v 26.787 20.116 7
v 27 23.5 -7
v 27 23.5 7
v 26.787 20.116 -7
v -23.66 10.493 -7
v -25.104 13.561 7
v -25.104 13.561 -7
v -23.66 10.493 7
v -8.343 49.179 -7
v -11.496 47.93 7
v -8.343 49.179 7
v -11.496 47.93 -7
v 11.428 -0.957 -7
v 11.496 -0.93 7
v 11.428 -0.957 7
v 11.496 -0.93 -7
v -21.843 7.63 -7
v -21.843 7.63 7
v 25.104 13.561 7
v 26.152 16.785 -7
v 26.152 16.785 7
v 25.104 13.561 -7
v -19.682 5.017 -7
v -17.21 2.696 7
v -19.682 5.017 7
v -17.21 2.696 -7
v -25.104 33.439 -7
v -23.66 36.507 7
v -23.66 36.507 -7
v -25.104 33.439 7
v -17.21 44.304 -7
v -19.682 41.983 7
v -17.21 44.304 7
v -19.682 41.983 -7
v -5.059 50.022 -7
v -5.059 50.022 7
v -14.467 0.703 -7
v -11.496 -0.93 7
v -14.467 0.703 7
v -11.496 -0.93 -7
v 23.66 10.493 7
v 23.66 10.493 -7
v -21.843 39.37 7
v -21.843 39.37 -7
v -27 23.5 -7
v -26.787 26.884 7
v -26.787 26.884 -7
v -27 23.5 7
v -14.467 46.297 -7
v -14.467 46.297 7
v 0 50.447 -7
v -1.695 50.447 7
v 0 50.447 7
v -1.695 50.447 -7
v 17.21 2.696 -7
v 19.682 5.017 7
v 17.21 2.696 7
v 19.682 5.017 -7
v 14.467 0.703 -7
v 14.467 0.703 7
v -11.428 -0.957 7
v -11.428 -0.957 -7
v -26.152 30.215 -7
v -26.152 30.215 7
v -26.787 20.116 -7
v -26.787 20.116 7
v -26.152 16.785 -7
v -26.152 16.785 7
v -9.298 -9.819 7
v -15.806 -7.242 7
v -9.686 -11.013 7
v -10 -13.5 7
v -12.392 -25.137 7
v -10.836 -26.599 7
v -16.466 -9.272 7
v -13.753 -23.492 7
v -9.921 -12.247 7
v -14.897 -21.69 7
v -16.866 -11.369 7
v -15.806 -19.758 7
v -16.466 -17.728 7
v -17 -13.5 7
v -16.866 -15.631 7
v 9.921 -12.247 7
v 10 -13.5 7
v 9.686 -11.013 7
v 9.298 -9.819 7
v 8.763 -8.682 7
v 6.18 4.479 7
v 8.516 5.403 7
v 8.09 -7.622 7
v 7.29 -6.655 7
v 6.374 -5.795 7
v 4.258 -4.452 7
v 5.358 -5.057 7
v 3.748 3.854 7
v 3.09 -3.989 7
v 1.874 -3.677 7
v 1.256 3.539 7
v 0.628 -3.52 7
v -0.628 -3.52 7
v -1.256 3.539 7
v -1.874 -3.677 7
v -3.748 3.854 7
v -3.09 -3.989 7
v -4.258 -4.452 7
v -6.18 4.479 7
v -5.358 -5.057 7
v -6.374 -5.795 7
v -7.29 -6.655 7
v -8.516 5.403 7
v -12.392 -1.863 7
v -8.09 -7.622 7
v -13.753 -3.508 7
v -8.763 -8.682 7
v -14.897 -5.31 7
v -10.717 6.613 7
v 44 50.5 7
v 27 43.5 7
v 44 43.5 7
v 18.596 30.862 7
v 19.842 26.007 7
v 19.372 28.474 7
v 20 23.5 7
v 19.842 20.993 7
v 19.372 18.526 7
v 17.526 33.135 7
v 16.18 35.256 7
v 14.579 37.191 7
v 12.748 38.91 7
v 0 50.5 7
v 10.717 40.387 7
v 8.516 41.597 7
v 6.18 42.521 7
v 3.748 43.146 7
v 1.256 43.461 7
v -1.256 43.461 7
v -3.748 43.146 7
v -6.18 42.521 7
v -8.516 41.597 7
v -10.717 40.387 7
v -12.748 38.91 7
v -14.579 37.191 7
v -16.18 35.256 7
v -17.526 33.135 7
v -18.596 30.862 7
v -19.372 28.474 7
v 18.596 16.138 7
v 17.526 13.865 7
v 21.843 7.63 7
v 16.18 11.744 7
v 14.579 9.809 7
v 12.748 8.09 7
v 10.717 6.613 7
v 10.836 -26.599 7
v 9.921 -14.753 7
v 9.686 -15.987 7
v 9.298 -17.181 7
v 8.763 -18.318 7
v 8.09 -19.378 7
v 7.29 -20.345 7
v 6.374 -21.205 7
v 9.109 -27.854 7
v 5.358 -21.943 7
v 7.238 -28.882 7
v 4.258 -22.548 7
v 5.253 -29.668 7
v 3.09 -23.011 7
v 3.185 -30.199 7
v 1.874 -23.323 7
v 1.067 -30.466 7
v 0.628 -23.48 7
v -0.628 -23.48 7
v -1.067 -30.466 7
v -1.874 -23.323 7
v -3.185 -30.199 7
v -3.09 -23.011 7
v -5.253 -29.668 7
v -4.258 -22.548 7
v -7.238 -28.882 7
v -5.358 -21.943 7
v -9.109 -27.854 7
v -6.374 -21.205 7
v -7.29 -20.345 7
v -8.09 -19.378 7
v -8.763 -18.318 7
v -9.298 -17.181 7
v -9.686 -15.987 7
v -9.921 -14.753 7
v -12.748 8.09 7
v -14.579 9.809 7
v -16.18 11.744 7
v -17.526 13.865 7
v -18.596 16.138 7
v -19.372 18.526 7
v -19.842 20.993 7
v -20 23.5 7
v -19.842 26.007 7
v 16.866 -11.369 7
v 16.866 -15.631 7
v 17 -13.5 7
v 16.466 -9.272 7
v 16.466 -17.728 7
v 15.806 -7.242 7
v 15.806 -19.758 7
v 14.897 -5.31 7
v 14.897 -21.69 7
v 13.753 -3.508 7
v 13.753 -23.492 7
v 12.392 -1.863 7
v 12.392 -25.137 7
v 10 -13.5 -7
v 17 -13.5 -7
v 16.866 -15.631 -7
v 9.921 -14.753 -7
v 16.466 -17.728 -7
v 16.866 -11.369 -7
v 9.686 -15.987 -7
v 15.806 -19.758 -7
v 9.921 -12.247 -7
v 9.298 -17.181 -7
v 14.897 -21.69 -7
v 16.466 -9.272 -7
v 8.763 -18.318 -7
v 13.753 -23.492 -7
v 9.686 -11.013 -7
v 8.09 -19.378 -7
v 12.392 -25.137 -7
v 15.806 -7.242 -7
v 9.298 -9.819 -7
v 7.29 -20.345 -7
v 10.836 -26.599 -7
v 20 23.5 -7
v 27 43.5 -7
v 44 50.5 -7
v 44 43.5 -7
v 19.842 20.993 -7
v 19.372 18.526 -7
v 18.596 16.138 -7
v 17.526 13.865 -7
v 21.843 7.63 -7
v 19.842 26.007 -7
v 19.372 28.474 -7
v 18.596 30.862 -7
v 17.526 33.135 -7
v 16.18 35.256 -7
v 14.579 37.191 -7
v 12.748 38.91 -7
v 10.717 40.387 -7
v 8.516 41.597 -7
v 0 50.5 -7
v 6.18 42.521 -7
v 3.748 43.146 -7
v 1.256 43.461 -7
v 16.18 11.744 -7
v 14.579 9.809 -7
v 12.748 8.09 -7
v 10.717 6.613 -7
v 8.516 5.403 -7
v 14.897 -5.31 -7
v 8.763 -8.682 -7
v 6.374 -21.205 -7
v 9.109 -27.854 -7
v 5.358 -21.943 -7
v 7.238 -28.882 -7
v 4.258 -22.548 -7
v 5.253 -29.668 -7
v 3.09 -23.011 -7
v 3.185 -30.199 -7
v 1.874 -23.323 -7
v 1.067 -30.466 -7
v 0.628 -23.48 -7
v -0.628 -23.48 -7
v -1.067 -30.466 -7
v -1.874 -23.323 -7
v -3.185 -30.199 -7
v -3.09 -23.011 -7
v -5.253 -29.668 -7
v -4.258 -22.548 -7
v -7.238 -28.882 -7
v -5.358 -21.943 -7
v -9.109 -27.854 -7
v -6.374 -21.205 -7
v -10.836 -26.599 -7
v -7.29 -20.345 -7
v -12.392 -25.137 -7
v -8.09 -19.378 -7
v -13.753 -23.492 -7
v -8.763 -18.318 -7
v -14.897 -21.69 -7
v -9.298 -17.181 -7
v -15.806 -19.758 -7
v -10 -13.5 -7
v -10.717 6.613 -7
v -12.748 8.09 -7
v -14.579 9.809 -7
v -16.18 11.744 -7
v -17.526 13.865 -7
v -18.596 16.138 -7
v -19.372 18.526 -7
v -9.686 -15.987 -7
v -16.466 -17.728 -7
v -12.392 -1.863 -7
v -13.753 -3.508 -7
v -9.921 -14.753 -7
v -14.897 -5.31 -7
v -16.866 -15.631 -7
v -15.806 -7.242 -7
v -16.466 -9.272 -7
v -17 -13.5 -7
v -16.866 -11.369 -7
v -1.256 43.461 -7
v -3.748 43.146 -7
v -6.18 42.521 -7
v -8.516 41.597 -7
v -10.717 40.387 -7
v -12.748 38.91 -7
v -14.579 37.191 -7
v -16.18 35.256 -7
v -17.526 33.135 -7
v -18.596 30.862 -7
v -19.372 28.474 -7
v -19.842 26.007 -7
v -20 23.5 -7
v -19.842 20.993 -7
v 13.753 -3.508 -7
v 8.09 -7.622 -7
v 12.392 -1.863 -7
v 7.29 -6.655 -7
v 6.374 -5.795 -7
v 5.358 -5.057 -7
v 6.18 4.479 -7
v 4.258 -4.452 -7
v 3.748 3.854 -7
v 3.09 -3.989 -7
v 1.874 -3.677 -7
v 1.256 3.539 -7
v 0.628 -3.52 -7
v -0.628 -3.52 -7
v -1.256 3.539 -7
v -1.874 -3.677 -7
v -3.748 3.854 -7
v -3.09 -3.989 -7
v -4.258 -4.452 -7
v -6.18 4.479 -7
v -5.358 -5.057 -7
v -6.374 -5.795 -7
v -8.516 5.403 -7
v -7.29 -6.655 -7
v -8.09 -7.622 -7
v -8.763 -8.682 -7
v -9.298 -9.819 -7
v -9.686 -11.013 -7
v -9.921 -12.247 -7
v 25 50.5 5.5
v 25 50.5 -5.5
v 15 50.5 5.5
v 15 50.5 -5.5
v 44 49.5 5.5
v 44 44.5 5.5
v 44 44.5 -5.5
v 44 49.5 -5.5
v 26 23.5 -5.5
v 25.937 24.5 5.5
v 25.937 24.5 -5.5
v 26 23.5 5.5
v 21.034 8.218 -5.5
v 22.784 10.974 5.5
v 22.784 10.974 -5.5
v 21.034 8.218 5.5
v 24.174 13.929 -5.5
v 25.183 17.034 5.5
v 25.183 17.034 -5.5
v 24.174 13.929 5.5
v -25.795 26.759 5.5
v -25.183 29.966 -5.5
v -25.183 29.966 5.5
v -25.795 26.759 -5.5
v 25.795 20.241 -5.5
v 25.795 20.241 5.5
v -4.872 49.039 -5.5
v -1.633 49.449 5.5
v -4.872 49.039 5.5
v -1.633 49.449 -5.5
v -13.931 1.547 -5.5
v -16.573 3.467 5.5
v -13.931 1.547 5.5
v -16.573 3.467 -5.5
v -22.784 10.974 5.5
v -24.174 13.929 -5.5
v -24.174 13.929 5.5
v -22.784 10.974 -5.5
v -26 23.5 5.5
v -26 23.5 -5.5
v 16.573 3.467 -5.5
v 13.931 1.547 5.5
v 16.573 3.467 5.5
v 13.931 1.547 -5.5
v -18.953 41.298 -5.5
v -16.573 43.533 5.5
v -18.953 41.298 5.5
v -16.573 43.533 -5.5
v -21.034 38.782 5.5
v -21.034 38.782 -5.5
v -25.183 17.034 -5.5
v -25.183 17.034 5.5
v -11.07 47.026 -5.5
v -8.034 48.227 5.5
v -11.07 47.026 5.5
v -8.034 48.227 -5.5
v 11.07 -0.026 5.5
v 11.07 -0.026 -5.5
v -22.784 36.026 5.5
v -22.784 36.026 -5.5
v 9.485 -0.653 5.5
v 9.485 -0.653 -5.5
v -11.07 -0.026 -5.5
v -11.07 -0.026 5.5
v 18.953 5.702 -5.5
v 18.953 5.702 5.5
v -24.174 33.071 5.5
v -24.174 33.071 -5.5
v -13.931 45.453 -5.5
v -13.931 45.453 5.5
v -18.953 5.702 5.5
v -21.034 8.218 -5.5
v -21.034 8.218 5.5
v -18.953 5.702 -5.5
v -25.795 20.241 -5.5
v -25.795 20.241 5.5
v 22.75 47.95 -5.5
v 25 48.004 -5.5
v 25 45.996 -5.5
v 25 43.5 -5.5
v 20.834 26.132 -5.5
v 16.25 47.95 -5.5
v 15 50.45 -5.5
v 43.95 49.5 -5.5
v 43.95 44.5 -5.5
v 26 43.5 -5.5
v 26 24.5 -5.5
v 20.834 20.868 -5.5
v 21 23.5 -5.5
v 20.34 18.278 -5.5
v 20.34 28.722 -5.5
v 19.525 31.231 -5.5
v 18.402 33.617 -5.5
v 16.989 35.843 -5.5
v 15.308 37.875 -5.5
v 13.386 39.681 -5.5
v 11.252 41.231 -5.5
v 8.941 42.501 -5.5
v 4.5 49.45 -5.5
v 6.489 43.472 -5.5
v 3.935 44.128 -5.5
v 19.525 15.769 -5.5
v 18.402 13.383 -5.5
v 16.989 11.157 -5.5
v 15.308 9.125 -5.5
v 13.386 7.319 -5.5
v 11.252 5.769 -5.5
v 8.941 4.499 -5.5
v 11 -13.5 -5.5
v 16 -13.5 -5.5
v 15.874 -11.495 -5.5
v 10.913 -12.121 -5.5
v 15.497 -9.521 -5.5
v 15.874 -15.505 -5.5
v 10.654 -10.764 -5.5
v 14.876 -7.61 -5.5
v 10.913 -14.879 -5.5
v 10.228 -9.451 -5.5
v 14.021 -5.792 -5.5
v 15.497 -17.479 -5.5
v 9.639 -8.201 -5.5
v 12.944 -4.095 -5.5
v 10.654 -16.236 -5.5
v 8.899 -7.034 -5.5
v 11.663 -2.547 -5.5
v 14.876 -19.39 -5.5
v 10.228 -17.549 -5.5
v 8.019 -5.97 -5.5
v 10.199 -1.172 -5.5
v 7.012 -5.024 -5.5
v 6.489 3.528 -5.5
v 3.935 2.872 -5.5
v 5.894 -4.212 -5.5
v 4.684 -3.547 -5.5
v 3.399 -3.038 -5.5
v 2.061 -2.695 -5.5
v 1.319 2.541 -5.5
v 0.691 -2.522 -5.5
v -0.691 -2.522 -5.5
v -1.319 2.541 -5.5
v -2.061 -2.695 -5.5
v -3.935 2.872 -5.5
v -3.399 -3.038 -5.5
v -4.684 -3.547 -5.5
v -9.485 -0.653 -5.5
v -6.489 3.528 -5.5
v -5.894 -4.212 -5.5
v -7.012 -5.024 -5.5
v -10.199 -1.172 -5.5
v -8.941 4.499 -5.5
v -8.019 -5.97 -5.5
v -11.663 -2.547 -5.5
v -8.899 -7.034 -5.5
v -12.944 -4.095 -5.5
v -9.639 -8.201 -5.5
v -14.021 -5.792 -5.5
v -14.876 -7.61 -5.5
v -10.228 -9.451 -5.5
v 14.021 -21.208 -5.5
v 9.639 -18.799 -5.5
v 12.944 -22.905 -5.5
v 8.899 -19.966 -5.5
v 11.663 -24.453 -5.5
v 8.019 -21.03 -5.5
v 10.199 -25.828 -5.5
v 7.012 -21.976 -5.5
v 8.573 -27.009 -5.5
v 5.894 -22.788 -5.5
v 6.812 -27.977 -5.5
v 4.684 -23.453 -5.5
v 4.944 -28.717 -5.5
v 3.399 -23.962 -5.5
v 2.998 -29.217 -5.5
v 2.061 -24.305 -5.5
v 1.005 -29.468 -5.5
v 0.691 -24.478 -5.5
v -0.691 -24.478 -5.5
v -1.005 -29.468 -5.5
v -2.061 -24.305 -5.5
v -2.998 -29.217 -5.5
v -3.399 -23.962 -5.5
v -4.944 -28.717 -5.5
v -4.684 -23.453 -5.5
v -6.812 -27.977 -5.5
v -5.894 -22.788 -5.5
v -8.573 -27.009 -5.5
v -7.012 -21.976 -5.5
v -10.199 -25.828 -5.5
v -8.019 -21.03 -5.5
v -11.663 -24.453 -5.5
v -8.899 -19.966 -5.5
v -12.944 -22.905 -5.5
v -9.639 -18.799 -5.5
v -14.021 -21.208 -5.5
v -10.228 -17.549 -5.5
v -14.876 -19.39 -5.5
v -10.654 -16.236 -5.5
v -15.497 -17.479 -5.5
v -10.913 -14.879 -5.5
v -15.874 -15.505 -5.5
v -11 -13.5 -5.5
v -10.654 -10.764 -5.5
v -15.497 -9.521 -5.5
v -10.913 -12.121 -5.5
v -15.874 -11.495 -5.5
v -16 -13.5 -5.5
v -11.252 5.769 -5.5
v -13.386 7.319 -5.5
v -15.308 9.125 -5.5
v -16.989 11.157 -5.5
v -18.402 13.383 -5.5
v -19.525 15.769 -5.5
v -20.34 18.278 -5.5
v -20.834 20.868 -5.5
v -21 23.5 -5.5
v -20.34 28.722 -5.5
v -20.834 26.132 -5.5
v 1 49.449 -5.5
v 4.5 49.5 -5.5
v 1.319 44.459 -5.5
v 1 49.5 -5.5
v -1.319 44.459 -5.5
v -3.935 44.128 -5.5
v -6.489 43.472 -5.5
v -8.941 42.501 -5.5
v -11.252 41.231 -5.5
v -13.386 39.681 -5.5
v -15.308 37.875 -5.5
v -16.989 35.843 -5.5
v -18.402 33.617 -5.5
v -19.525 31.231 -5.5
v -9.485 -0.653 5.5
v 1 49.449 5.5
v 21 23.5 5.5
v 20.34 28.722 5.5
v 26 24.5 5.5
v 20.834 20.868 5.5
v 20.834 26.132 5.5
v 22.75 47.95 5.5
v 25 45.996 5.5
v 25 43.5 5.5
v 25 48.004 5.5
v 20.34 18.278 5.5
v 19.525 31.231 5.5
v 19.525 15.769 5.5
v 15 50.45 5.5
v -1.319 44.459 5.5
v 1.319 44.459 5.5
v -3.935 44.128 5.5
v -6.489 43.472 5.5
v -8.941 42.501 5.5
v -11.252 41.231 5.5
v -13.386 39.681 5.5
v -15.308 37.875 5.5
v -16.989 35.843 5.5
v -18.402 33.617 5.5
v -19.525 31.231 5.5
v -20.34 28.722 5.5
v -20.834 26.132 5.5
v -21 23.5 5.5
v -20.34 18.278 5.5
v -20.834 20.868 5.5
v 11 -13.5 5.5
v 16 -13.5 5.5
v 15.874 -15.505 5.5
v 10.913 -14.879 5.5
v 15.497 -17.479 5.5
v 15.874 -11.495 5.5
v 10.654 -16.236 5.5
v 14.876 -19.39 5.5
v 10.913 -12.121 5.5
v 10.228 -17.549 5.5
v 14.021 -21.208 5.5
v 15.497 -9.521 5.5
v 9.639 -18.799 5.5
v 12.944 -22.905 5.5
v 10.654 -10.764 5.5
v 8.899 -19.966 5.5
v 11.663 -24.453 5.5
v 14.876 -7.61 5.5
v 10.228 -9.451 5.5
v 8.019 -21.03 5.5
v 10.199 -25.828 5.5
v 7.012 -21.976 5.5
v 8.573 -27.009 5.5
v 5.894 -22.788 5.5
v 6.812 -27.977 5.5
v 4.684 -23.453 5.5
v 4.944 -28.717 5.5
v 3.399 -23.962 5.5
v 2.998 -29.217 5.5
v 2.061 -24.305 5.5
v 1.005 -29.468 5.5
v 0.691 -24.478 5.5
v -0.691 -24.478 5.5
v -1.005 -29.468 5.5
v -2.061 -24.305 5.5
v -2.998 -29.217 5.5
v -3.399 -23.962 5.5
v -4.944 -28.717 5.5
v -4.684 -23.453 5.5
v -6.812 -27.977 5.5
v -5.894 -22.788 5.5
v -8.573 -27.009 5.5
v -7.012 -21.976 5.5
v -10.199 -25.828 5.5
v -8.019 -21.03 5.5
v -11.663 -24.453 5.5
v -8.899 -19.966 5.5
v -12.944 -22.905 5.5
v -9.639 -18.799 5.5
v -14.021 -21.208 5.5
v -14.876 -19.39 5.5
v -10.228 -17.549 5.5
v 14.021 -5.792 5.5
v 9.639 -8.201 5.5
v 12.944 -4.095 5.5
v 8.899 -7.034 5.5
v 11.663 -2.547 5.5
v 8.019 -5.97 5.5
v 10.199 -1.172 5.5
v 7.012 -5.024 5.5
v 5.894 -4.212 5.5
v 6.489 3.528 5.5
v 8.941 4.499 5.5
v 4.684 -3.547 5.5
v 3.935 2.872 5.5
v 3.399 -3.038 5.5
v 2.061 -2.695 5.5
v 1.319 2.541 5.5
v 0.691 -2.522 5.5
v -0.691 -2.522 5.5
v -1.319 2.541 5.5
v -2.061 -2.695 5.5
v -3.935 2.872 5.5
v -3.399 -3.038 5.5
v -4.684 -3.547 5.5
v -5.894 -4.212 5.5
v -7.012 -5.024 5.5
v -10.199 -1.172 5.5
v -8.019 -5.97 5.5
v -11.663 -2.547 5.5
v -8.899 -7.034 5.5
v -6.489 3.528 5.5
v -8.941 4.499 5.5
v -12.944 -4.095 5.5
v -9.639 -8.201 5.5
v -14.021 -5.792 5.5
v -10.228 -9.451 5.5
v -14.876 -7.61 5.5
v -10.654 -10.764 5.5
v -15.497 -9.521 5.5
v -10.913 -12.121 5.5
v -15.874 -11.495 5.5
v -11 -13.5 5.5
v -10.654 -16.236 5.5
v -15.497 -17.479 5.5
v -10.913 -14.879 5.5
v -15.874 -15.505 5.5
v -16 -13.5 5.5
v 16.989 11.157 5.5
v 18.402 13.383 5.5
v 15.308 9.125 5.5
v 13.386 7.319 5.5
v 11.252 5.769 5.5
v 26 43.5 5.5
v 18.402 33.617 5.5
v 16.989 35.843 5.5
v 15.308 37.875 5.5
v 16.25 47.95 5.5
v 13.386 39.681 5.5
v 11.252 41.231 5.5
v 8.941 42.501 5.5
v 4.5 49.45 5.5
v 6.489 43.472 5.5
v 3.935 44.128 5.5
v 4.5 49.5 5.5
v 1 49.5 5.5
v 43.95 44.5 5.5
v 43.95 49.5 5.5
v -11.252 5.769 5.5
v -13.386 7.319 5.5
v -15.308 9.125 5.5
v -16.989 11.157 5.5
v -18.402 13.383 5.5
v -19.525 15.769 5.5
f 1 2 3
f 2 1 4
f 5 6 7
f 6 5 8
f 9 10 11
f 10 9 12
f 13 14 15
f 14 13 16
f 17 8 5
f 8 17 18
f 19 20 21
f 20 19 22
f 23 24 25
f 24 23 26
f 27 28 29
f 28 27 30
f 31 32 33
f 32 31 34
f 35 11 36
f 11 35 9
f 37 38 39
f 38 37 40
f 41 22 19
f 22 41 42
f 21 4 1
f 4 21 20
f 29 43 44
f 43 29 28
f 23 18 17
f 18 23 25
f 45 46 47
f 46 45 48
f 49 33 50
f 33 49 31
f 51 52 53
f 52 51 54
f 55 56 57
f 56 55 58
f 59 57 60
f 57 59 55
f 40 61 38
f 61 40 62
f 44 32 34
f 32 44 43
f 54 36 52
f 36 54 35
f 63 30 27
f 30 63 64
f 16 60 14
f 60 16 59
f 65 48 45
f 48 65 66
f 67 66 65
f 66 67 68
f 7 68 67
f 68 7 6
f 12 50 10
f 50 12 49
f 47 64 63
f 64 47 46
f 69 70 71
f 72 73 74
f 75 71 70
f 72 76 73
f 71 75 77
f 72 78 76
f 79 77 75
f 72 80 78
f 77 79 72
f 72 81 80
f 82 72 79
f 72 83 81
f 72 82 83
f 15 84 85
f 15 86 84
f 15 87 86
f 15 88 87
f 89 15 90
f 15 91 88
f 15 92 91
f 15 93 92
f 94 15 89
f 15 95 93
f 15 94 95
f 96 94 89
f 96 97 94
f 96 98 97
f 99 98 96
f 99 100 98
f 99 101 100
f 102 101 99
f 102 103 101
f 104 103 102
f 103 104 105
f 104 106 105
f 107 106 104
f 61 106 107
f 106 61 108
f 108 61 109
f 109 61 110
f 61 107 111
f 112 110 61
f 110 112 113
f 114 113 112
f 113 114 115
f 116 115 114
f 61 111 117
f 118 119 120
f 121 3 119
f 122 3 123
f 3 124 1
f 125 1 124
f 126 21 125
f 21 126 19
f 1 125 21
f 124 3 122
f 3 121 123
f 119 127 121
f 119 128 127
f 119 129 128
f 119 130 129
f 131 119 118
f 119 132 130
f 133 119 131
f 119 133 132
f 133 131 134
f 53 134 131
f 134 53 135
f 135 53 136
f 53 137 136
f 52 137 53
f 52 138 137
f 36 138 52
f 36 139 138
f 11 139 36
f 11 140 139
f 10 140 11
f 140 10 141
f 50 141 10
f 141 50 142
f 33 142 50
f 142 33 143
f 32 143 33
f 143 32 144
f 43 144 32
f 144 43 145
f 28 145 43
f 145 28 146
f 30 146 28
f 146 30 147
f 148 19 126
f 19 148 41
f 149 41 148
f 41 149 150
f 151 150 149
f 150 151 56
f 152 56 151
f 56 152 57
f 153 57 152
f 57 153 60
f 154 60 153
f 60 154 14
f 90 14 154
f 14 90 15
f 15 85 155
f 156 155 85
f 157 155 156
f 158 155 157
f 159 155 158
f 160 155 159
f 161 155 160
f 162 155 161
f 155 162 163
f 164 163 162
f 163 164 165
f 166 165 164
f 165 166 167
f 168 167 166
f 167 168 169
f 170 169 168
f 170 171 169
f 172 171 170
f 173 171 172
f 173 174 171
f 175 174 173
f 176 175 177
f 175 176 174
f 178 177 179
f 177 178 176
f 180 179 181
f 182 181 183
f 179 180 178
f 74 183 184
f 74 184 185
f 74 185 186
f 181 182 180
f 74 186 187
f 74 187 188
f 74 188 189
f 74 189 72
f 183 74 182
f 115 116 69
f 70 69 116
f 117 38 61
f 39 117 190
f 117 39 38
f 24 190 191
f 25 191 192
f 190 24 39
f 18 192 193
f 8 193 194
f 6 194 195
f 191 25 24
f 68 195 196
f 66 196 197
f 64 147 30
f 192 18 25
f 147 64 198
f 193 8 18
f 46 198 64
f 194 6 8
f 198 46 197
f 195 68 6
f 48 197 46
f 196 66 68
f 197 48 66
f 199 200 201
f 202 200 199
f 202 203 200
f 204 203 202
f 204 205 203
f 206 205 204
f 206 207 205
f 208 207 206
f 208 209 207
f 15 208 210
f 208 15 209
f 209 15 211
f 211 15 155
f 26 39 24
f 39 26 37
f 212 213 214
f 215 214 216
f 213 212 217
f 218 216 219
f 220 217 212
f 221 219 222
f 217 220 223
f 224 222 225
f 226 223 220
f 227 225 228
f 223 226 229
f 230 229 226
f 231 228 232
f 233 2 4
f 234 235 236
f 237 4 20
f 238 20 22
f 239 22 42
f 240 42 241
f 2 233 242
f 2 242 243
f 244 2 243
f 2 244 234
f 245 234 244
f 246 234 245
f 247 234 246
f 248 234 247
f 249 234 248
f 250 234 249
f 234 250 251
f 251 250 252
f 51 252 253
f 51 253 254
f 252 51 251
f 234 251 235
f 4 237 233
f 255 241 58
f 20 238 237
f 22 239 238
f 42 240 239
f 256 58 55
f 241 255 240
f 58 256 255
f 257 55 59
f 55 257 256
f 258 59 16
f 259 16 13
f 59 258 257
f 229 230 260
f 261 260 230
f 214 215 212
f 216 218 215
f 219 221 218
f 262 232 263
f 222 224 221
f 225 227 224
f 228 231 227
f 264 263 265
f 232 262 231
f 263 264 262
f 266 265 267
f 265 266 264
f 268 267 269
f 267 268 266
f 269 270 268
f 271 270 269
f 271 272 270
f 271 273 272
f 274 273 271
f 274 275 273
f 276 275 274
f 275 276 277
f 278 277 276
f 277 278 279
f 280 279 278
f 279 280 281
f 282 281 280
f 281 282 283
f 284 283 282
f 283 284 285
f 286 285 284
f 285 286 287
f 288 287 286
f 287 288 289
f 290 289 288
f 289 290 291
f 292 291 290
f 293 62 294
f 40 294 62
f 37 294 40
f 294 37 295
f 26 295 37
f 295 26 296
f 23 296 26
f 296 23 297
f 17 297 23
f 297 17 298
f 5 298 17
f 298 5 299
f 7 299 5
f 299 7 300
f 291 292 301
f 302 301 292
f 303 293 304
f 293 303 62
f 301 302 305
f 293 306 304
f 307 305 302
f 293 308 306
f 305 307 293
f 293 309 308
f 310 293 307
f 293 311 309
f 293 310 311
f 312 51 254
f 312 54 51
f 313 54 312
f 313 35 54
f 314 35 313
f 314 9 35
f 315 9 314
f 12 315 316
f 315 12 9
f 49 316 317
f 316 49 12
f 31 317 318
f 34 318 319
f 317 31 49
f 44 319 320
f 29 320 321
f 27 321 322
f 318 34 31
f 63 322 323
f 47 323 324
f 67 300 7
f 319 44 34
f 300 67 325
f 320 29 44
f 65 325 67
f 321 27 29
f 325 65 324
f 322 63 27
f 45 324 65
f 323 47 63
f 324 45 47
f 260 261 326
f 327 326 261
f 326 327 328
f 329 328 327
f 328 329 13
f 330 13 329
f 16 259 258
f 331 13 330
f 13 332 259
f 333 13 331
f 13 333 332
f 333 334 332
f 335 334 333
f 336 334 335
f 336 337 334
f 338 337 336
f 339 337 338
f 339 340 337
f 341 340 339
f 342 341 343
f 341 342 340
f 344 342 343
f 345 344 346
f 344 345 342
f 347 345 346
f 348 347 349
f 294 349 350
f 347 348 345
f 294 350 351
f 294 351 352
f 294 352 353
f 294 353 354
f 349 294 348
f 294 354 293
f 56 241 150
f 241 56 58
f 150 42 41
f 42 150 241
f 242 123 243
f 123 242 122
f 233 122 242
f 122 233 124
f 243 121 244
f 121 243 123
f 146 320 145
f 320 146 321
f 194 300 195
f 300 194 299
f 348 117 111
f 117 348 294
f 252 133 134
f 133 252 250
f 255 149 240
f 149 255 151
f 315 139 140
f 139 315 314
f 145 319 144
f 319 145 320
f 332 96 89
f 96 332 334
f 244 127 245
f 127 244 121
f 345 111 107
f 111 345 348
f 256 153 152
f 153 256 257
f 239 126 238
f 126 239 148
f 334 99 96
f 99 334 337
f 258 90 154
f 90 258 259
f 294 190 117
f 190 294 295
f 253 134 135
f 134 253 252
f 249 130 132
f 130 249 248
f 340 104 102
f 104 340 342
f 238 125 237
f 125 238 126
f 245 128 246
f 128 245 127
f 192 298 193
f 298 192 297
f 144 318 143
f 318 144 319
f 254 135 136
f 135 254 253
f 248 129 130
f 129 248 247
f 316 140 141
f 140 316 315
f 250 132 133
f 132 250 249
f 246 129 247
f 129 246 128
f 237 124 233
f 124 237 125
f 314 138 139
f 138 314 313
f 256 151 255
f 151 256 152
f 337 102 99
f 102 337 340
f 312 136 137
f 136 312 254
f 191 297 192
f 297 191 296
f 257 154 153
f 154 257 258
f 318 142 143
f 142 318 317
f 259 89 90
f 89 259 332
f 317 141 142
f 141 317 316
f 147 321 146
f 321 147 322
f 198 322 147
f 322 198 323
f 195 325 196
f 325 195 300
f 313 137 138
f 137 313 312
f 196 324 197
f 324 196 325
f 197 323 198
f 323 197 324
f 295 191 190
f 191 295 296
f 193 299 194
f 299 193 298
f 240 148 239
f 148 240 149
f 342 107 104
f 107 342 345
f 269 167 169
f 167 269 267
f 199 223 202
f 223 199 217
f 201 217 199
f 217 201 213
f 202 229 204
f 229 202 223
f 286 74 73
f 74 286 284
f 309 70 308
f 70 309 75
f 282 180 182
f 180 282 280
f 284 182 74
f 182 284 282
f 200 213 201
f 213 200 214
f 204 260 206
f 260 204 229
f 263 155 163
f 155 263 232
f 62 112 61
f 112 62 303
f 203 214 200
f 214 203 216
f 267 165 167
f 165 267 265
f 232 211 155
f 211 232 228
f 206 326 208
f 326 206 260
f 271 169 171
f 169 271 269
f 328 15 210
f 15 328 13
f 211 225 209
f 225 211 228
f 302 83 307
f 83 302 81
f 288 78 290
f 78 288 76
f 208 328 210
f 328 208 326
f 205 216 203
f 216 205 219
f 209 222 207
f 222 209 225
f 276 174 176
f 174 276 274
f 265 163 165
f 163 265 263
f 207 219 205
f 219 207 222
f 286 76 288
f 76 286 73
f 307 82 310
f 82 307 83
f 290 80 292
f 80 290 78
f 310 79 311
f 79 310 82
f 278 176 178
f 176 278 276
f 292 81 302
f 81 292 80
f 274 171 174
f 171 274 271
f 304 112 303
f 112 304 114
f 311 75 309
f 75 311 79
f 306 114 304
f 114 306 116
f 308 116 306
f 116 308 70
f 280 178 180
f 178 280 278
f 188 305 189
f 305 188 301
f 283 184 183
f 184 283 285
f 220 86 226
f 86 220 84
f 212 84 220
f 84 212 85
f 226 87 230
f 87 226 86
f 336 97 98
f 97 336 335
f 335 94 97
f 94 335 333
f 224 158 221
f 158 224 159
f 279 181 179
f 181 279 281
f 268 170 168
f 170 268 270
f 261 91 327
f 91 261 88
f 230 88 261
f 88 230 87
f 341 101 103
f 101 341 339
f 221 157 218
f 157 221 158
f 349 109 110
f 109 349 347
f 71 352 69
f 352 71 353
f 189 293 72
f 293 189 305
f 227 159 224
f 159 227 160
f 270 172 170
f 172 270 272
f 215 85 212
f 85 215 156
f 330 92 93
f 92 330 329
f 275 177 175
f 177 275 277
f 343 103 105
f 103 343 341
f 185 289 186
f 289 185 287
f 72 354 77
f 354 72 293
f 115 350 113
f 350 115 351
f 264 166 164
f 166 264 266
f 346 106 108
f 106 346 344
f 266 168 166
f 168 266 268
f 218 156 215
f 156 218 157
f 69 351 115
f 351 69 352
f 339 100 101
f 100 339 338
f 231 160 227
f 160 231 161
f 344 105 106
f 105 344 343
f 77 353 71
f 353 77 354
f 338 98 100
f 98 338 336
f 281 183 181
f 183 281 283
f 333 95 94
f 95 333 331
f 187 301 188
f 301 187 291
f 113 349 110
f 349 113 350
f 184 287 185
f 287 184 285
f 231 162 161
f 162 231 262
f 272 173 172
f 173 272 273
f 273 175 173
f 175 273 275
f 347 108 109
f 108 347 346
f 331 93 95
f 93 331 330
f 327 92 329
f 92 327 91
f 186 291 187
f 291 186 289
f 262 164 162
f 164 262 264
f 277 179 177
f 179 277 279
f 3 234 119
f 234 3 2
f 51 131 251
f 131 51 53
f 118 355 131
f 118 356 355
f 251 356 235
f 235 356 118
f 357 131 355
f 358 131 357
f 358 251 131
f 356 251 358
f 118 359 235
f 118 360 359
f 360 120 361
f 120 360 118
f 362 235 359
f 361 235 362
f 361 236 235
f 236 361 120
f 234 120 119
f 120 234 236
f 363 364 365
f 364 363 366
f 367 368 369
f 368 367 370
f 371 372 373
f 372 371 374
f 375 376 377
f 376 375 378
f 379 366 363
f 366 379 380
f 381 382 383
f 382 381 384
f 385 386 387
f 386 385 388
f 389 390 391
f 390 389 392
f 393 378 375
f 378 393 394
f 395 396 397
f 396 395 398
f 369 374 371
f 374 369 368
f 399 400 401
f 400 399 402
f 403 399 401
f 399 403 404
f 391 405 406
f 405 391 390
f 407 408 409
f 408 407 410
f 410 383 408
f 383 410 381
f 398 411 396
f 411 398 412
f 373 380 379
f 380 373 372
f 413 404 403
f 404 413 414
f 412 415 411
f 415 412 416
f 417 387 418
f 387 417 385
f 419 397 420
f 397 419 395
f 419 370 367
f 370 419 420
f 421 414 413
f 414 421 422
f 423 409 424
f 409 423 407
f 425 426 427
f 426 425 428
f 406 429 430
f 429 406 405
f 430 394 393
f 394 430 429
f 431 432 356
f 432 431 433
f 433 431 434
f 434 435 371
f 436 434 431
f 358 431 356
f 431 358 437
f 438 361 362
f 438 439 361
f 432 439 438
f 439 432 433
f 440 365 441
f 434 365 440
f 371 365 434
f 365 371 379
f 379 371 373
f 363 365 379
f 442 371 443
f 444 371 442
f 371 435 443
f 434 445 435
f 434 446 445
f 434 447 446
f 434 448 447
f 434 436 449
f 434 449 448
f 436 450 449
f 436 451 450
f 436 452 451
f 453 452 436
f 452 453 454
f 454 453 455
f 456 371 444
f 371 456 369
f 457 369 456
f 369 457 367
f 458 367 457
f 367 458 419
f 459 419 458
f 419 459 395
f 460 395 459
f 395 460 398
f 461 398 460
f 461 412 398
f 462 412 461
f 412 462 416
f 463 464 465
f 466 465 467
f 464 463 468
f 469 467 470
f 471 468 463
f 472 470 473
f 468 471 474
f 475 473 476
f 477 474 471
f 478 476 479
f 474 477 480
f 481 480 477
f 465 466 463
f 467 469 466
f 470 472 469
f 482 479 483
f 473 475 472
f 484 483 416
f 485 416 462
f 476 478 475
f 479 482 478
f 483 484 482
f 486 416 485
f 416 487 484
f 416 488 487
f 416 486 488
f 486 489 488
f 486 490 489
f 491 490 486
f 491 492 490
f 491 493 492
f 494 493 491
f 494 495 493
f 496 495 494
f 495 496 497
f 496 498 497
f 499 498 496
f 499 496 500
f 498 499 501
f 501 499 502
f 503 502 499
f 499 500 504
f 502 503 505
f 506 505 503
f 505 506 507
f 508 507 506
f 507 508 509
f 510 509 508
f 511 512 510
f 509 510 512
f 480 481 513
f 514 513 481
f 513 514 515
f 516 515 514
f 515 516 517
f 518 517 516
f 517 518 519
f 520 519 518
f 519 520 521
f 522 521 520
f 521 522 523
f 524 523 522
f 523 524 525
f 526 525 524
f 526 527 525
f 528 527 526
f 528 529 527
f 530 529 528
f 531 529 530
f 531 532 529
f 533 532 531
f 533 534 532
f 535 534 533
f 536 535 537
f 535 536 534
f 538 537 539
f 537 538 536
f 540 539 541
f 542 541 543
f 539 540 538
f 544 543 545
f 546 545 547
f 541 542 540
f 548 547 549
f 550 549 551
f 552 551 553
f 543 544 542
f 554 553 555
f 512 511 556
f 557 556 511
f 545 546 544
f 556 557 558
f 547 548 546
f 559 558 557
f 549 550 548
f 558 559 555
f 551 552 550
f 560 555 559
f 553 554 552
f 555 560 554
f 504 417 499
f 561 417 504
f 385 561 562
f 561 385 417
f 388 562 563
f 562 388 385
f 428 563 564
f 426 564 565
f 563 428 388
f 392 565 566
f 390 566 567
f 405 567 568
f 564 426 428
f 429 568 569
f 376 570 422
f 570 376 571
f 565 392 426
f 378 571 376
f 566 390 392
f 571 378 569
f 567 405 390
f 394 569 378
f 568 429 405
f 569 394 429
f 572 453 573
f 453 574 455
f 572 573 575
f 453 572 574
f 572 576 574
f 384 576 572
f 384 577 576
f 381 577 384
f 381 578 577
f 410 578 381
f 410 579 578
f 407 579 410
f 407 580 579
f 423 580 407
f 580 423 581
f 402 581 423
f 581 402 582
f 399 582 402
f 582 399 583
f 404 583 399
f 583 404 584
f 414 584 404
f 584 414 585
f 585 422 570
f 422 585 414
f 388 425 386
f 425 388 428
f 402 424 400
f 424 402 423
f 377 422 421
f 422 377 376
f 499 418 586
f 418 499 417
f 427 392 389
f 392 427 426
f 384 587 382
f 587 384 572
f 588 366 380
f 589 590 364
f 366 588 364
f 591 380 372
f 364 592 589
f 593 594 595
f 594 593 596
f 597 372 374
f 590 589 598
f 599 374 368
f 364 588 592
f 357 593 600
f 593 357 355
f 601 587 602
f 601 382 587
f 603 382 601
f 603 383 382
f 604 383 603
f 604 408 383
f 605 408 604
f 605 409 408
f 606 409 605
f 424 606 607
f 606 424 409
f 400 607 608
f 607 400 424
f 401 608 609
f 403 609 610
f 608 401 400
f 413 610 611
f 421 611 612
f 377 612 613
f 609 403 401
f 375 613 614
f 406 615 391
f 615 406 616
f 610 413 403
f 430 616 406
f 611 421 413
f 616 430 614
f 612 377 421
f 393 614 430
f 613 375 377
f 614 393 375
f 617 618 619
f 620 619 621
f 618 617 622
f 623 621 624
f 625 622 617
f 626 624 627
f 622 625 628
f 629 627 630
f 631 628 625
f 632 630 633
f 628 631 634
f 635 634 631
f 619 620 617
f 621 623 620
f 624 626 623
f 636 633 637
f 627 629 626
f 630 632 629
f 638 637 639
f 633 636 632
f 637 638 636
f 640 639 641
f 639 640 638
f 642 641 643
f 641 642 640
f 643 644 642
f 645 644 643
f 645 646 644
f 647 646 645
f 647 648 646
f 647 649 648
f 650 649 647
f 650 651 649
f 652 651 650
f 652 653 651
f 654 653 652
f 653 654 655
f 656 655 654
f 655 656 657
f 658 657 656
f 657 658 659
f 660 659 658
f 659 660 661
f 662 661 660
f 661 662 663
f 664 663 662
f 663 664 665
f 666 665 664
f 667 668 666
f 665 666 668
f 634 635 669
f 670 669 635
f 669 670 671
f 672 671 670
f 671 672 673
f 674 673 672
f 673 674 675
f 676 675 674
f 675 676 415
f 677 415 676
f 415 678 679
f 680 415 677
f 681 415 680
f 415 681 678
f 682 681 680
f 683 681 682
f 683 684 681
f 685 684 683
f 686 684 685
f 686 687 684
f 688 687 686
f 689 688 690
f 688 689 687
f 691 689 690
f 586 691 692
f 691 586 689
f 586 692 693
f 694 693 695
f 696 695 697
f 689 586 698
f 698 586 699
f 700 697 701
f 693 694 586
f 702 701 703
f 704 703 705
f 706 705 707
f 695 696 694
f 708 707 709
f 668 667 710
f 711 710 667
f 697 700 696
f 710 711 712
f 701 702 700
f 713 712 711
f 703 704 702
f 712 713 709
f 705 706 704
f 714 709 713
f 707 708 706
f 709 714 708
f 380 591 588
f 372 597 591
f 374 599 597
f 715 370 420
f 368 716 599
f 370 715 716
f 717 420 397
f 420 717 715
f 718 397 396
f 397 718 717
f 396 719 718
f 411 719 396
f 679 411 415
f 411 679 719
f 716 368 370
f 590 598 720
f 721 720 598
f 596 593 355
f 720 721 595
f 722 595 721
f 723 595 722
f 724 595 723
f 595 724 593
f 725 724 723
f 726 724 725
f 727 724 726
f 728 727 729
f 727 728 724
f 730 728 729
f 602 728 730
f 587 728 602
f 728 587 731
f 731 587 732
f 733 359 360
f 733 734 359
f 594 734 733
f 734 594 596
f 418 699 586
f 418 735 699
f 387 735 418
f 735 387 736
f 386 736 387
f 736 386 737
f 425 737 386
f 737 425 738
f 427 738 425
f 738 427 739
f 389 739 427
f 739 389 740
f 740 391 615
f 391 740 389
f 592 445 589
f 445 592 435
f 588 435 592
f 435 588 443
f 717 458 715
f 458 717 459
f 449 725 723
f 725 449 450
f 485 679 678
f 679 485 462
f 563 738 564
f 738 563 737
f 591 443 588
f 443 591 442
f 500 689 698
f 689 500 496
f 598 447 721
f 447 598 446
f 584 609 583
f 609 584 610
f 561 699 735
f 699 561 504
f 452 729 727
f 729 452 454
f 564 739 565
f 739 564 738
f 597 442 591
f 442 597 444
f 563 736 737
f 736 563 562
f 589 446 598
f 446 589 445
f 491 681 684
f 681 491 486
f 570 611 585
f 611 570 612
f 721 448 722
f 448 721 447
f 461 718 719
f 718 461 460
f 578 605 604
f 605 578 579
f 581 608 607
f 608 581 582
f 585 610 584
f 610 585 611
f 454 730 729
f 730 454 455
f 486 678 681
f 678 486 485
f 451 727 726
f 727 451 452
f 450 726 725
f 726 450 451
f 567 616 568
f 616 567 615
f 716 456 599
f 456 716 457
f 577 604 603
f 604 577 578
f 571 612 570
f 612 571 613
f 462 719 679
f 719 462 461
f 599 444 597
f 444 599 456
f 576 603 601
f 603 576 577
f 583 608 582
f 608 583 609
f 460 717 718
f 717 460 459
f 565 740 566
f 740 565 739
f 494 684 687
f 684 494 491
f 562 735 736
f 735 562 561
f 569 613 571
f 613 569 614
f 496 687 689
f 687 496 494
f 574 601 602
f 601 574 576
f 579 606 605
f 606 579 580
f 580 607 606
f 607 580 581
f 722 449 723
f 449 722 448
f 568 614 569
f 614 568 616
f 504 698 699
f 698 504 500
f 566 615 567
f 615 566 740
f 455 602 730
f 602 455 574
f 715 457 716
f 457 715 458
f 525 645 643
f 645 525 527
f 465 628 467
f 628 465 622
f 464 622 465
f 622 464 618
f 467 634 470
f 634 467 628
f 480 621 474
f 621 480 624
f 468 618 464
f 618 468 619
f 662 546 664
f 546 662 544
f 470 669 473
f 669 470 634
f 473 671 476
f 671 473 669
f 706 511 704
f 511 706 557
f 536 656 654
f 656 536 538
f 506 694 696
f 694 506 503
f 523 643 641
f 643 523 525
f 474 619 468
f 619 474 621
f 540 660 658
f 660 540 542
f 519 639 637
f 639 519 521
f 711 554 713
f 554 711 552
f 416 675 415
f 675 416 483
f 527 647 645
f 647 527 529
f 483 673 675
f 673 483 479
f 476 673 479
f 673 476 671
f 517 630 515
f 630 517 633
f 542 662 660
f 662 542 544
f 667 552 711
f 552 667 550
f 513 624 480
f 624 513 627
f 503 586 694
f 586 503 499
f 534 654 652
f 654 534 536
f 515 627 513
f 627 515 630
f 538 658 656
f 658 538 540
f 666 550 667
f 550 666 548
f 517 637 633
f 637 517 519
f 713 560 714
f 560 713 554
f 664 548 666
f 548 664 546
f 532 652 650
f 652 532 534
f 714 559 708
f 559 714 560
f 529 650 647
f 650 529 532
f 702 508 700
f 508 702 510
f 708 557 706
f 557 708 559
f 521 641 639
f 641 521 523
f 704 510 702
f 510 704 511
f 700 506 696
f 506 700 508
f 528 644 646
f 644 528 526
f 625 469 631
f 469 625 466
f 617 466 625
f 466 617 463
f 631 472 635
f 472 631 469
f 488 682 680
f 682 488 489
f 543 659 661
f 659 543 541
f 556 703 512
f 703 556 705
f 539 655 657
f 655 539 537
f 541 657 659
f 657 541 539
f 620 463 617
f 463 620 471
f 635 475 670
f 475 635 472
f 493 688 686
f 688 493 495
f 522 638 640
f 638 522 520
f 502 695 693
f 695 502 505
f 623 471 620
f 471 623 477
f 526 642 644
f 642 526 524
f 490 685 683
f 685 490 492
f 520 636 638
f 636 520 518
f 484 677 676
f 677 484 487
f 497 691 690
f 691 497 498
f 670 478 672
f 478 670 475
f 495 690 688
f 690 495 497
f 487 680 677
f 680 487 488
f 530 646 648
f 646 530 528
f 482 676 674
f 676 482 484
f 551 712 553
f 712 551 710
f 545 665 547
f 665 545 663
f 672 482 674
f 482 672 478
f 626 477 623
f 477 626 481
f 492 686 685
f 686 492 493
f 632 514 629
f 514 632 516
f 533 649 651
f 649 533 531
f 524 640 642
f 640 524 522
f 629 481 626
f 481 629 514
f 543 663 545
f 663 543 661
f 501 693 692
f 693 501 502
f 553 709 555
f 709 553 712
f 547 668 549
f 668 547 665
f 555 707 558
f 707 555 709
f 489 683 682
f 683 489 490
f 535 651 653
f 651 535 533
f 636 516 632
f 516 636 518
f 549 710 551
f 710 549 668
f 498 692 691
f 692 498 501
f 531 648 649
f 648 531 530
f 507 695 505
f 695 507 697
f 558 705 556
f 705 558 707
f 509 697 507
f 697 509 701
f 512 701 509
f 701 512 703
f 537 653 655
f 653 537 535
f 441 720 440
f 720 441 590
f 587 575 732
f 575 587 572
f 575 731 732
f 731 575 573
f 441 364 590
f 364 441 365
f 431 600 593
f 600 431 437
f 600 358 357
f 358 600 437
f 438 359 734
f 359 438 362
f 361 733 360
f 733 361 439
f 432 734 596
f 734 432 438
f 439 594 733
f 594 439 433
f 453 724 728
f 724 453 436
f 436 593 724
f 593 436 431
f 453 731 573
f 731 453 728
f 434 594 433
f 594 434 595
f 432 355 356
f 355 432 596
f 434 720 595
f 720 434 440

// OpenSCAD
/* Dual Tone Whistle - Customizable */
/* 2014-10-25 Roman Hegglin */

/* [Main Settings] */
//Diameter of the first loop
dia1=54;

//Diameter of the second loop
dia2=34;

//Height
height=14;

/* [Advanced Settings] */

// The mesh resolution

mesh_resolution=50; // [20:120]


$fn=mesh_resolution; 

difference()
{
//translate([0,0,-3])
//body
union(){
//loop 1 near Mouthpiece
translate([0,dia1/2-3.5,0])
difference() {
cylinder(r=dia1/2, h=height,center=true);
cylinder(r=dia1/2-7, h=height+1,center=true);
}
//loop 2
translate([0,-dia2/2+3.5,0])
difference() {
cylinder(r=dia2/2, h=height,center=true);
cylinder(r=dia2/2-7, h=height+1,center=true);
}
//Mouthpiece
difference() {
translate([dia1/4,dia1/4*3-3.5,0])
cube(size = [dia1/2,dia1/2,height], center = true);
translate([0,dia1/2-3.5,0])
cylinder(r=dia1/2-7, h=height+1,center=true);
}

translate([(dia1/2+17)/2,dia1-7,0])
cube(size = [dia1/2+17,7,height], center = true);


}

//cavity
difference() {
union(){
//loop 1 near Mouthpiece
translate([0,dia1/2-3.5,0])
difference() {
cylinder(r=dia1/2-1, h=height-3,center=true);
cylinder(r=dia1/2-7+1, h=height+1-3,center=true);
}
//loop 2
translate([0,-dia2/2+3.5,0])
difference() {
cylinder(r=dia2/2-1, h=height-3,center=true);
cylinder(r=dia2/2-7+1, h=height+1-3,center=true);
}
//Mouthpiece
difference() {
translate([dia1/4,dia1/4*3-3.5,0])
cube(size = [dia1/2-2,dia1/2-2,height-3], center = true);
translate([0,dia1/2-3.5,0])
cylinder(r=dia1/2-7+1, h=height+1,center=true);
}

hole1 ();
hole2 ();

}
add1 ();
add2 ();
}
}

module hole1 () 
{
hull() {//blowcanal
translate([dia1/2+17,dia1-7,0])
cube(size = [0.1,5,height-3], center = true);

translate([dia1/2-2,dia1-7,0])
cube(size = [0.1,2,height-3], center = true);
}
}

module hole2 ()
{
hull() {//whislte hole
translate([dia1/2-7,dia1-3.5,0])
cube(size = [10,0.1,height-3], center = true);
translate([dia1/2-3,dia1-4-2,0])
cube(size = [2.5,0.1,height-3], center = true);
}
translate([dia1/2-3,dia1-5.5,0])
cube(size = [2.5,7-2,height-3], center = true);
}

module add1 ()
{
difference () {
hull() {
translate([dia1/4,dia1-3.5-1,0])
cube(size = [dia1/3,0.1,height-2], center = true);
translate([dia1/2-7,dia1-3.5-2.5,0])
cube(size = [7.5,0.1,height-2], center = true);
}
hole2 ();
}
}

module add2 ()
{
difference () {
translate([dia1/2-1.5,dia1-7,0])
cube(size = [1,7,height-2], center = true);

hole1 ();
}
}
